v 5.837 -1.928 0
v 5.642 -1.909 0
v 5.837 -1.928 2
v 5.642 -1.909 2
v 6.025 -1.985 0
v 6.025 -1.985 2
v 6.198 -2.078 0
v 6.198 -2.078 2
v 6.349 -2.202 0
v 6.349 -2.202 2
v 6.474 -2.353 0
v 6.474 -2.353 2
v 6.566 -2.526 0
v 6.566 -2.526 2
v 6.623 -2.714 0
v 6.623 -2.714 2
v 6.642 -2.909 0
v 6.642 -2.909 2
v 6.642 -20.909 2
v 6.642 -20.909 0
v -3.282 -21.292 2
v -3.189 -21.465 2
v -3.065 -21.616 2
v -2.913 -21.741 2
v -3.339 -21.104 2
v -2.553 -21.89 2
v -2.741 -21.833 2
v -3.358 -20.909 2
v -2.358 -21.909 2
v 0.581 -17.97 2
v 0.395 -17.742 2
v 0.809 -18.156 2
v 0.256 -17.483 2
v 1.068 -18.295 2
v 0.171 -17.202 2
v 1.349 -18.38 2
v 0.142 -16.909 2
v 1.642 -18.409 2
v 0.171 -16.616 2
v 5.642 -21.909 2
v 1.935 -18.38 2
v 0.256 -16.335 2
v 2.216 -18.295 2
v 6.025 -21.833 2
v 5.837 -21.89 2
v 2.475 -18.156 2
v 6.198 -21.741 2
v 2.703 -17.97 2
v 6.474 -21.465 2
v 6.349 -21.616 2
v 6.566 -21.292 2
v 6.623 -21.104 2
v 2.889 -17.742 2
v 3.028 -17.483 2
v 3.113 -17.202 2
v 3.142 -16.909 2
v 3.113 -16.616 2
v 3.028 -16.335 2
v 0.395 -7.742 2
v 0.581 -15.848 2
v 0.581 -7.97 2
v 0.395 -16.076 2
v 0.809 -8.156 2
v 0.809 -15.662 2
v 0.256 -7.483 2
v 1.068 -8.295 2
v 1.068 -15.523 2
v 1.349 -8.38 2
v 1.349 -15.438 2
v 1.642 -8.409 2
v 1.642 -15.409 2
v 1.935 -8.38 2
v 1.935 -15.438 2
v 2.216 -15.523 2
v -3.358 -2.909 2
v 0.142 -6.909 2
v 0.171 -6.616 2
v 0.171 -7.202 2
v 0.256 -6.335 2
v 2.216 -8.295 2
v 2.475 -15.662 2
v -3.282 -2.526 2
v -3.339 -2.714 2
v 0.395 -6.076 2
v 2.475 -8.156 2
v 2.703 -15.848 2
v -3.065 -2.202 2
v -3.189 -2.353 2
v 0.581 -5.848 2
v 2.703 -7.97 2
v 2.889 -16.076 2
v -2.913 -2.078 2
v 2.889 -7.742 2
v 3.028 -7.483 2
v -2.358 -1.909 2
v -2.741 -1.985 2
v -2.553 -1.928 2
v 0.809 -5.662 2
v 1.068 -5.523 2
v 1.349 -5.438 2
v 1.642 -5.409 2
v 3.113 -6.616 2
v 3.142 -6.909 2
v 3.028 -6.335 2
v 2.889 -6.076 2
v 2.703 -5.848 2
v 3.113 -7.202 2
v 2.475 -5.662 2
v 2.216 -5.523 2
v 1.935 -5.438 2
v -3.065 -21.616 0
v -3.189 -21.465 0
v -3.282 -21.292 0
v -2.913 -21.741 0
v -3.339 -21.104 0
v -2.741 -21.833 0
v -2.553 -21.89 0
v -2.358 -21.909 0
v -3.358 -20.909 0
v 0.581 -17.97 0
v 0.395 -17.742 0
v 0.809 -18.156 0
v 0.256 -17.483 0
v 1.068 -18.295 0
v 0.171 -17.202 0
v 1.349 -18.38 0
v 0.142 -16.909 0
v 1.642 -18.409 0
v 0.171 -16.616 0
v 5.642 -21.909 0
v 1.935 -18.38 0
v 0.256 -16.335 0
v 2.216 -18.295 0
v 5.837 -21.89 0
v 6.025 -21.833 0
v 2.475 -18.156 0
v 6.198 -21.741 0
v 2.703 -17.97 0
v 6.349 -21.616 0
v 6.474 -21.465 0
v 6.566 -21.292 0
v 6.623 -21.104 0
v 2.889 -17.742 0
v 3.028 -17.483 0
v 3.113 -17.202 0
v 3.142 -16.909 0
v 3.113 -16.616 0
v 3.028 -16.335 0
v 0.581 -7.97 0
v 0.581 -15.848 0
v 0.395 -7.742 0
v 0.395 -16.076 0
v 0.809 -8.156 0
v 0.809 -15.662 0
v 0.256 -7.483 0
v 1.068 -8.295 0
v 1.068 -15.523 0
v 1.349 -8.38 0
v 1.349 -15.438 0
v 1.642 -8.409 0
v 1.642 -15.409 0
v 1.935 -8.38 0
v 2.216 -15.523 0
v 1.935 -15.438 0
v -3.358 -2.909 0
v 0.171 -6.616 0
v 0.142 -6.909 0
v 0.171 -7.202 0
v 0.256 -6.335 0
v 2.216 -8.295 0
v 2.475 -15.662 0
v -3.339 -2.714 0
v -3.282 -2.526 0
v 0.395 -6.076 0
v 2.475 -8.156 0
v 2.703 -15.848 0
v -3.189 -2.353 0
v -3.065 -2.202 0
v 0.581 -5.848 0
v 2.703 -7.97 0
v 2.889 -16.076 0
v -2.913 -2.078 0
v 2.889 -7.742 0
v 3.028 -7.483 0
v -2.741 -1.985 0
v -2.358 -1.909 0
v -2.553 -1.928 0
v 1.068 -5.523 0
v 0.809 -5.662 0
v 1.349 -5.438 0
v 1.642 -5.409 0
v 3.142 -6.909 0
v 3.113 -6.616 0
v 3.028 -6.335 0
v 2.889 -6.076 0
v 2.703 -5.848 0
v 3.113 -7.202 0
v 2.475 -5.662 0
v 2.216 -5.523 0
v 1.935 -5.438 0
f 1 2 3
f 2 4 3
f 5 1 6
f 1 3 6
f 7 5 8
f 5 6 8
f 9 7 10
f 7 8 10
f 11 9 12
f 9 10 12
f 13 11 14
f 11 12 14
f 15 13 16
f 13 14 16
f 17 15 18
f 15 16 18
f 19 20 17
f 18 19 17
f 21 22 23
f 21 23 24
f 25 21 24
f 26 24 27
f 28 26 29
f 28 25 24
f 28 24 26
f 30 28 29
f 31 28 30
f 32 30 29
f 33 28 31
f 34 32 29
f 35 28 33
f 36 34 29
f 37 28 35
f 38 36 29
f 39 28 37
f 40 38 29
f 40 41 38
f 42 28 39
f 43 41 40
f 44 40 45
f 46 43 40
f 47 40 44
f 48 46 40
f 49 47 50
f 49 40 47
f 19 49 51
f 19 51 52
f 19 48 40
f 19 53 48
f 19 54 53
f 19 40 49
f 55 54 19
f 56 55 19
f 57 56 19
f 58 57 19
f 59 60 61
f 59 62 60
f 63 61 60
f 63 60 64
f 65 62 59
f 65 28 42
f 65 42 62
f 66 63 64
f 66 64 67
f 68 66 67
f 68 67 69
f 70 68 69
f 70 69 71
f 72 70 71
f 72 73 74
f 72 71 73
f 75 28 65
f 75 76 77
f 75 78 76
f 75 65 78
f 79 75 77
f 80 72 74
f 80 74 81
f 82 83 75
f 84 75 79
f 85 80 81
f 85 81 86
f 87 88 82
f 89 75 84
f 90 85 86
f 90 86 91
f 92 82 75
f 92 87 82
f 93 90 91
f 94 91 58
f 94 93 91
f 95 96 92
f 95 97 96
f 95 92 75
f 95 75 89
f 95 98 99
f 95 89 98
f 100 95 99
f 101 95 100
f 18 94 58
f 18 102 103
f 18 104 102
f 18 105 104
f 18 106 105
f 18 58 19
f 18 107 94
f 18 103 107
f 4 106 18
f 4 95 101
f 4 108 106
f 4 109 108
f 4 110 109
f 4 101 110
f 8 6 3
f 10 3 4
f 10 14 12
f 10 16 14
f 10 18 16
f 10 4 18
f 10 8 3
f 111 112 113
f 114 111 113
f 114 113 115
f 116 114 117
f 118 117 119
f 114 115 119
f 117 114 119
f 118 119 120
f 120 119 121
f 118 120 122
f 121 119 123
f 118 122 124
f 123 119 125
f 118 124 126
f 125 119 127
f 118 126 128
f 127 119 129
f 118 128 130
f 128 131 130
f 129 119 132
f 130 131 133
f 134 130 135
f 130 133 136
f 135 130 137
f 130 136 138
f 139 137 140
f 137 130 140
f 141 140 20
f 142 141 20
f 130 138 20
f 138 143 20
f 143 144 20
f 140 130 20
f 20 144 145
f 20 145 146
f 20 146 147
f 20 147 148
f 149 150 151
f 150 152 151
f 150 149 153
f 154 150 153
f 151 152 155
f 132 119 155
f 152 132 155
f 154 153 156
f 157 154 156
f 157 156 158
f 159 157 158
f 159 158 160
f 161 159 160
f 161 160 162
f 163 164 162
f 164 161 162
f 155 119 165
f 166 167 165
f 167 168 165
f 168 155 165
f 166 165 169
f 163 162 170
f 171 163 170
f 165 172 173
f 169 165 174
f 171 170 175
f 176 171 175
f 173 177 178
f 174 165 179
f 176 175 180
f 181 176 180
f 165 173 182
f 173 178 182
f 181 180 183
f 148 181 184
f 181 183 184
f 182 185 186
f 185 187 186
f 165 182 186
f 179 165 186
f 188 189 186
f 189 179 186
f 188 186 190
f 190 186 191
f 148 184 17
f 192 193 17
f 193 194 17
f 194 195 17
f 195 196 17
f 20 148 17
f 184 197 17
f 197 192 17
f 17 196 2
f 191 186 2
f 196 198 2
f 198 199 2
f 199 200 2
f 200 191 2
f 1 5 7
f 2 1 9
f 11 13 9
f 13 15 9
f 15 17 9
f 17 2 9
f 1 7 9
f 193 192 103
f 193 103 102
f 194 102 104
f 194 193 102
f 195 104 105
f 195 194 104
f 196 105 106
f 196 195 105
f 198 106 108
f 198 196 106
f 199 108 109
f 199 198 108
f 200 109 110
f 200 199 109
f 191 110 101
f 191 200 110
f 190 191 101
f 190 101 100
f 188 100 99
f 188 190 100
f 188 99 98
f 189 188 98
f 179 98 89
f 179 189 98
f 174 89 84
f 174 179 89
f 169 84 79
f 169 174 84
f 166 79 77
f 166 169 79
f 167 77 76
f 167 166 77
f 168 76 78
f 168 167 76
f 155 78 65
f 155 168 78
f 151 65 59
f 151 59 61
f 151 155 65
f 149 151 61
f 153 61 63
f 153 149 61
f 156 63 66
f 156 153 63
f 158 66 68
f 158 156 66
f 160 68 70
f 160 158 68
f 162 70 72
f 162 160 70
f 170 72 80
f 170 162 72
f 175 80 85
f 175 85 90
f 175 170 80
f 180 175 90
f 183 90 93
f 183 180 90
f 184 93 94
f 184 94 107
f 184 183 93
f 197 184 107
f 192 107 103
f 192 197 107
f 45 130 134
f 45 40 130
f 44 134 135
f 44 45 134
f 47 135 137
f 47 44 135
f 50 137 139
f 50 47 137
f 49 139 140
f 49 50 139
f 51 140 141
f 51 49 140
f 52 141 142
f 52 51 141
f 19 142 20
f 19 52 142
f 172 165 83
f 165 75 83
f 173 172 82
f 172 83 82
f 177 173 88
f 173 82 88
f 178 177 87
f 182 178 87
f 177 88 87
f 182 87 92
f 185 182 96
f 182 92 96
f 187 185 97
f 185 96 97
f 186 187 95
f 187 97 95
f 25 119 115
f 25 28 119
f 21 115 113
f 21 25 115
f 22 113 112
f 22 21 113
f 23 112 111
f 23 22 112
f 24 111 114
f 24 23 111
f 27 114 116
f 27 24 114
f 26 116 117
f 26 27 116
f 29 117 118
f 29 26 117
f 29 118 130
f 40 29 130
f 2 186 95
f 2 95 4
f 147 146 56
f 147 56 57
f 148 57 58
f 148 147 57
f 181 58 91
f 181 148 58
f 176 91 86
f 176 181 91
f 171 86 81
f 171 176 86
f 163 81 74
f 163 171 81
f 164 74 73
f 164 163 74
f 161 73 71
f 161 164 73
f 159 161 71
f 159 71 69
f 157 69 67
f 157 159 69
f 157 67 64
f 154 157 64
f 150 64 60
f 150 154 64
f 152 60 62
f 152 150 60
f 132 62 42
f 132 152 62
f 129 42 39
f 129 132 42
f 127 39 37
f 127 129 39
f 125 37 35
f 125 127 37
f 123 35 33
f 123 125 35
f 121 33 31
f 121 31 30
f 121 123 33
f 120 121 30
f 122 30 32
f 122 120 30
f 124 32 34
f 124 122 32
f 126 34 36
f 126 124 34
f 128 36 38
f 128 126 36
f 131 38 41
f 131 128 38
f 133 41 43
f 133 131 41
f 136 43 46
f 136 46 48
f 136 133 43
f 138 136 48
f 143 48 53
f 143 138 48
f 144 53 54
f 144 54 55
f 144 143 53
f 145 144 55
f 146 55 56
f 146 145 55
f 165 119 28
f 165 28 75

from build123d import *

# Parameters (mm, degrees)
SKETCH_1_W      = 10
SKETCH_1_H      = 20
SKETCH_1_R      = 1.5
EXTRUDE_1_DEPTH = 2
FILLET_1_R      = 1


with BuildPart() as part:
    # 草图1 → 凸台-拉伸1 (new body)
    with BuildSketch(Plane.XY):
        with Locations((1.642083631, -11.90903272)):
            Rectangle(SKETCH_1_W, SKETCH_1_H)
        with Locations((1.642083631, -6.90903272)):
            Circle(SKETCH_1_R, mode=Mode.SUBTRACT)
        with Locations((1.642083631, -16.90903272)):
            Circle(SKETCH_1_R, mode=Mode.SUBTRACT)
    extrude(amount=EXTRUDE_1_DEPTH)

    # 圆角1
    fillet_1_edges = [part.edges().sort_by_distance(p)[0] for p in [
        (-3.357916369, -1.90903272, 1),
        (6.642083631, -1.90903272, 1),
        (6.642083631, -21.90903272, 1),
        (-3.357916369, -21.90903272, 1),
    ]]
    fillet(fillet_1_edges, radius=FILLET_1_R)


solid = part.part
